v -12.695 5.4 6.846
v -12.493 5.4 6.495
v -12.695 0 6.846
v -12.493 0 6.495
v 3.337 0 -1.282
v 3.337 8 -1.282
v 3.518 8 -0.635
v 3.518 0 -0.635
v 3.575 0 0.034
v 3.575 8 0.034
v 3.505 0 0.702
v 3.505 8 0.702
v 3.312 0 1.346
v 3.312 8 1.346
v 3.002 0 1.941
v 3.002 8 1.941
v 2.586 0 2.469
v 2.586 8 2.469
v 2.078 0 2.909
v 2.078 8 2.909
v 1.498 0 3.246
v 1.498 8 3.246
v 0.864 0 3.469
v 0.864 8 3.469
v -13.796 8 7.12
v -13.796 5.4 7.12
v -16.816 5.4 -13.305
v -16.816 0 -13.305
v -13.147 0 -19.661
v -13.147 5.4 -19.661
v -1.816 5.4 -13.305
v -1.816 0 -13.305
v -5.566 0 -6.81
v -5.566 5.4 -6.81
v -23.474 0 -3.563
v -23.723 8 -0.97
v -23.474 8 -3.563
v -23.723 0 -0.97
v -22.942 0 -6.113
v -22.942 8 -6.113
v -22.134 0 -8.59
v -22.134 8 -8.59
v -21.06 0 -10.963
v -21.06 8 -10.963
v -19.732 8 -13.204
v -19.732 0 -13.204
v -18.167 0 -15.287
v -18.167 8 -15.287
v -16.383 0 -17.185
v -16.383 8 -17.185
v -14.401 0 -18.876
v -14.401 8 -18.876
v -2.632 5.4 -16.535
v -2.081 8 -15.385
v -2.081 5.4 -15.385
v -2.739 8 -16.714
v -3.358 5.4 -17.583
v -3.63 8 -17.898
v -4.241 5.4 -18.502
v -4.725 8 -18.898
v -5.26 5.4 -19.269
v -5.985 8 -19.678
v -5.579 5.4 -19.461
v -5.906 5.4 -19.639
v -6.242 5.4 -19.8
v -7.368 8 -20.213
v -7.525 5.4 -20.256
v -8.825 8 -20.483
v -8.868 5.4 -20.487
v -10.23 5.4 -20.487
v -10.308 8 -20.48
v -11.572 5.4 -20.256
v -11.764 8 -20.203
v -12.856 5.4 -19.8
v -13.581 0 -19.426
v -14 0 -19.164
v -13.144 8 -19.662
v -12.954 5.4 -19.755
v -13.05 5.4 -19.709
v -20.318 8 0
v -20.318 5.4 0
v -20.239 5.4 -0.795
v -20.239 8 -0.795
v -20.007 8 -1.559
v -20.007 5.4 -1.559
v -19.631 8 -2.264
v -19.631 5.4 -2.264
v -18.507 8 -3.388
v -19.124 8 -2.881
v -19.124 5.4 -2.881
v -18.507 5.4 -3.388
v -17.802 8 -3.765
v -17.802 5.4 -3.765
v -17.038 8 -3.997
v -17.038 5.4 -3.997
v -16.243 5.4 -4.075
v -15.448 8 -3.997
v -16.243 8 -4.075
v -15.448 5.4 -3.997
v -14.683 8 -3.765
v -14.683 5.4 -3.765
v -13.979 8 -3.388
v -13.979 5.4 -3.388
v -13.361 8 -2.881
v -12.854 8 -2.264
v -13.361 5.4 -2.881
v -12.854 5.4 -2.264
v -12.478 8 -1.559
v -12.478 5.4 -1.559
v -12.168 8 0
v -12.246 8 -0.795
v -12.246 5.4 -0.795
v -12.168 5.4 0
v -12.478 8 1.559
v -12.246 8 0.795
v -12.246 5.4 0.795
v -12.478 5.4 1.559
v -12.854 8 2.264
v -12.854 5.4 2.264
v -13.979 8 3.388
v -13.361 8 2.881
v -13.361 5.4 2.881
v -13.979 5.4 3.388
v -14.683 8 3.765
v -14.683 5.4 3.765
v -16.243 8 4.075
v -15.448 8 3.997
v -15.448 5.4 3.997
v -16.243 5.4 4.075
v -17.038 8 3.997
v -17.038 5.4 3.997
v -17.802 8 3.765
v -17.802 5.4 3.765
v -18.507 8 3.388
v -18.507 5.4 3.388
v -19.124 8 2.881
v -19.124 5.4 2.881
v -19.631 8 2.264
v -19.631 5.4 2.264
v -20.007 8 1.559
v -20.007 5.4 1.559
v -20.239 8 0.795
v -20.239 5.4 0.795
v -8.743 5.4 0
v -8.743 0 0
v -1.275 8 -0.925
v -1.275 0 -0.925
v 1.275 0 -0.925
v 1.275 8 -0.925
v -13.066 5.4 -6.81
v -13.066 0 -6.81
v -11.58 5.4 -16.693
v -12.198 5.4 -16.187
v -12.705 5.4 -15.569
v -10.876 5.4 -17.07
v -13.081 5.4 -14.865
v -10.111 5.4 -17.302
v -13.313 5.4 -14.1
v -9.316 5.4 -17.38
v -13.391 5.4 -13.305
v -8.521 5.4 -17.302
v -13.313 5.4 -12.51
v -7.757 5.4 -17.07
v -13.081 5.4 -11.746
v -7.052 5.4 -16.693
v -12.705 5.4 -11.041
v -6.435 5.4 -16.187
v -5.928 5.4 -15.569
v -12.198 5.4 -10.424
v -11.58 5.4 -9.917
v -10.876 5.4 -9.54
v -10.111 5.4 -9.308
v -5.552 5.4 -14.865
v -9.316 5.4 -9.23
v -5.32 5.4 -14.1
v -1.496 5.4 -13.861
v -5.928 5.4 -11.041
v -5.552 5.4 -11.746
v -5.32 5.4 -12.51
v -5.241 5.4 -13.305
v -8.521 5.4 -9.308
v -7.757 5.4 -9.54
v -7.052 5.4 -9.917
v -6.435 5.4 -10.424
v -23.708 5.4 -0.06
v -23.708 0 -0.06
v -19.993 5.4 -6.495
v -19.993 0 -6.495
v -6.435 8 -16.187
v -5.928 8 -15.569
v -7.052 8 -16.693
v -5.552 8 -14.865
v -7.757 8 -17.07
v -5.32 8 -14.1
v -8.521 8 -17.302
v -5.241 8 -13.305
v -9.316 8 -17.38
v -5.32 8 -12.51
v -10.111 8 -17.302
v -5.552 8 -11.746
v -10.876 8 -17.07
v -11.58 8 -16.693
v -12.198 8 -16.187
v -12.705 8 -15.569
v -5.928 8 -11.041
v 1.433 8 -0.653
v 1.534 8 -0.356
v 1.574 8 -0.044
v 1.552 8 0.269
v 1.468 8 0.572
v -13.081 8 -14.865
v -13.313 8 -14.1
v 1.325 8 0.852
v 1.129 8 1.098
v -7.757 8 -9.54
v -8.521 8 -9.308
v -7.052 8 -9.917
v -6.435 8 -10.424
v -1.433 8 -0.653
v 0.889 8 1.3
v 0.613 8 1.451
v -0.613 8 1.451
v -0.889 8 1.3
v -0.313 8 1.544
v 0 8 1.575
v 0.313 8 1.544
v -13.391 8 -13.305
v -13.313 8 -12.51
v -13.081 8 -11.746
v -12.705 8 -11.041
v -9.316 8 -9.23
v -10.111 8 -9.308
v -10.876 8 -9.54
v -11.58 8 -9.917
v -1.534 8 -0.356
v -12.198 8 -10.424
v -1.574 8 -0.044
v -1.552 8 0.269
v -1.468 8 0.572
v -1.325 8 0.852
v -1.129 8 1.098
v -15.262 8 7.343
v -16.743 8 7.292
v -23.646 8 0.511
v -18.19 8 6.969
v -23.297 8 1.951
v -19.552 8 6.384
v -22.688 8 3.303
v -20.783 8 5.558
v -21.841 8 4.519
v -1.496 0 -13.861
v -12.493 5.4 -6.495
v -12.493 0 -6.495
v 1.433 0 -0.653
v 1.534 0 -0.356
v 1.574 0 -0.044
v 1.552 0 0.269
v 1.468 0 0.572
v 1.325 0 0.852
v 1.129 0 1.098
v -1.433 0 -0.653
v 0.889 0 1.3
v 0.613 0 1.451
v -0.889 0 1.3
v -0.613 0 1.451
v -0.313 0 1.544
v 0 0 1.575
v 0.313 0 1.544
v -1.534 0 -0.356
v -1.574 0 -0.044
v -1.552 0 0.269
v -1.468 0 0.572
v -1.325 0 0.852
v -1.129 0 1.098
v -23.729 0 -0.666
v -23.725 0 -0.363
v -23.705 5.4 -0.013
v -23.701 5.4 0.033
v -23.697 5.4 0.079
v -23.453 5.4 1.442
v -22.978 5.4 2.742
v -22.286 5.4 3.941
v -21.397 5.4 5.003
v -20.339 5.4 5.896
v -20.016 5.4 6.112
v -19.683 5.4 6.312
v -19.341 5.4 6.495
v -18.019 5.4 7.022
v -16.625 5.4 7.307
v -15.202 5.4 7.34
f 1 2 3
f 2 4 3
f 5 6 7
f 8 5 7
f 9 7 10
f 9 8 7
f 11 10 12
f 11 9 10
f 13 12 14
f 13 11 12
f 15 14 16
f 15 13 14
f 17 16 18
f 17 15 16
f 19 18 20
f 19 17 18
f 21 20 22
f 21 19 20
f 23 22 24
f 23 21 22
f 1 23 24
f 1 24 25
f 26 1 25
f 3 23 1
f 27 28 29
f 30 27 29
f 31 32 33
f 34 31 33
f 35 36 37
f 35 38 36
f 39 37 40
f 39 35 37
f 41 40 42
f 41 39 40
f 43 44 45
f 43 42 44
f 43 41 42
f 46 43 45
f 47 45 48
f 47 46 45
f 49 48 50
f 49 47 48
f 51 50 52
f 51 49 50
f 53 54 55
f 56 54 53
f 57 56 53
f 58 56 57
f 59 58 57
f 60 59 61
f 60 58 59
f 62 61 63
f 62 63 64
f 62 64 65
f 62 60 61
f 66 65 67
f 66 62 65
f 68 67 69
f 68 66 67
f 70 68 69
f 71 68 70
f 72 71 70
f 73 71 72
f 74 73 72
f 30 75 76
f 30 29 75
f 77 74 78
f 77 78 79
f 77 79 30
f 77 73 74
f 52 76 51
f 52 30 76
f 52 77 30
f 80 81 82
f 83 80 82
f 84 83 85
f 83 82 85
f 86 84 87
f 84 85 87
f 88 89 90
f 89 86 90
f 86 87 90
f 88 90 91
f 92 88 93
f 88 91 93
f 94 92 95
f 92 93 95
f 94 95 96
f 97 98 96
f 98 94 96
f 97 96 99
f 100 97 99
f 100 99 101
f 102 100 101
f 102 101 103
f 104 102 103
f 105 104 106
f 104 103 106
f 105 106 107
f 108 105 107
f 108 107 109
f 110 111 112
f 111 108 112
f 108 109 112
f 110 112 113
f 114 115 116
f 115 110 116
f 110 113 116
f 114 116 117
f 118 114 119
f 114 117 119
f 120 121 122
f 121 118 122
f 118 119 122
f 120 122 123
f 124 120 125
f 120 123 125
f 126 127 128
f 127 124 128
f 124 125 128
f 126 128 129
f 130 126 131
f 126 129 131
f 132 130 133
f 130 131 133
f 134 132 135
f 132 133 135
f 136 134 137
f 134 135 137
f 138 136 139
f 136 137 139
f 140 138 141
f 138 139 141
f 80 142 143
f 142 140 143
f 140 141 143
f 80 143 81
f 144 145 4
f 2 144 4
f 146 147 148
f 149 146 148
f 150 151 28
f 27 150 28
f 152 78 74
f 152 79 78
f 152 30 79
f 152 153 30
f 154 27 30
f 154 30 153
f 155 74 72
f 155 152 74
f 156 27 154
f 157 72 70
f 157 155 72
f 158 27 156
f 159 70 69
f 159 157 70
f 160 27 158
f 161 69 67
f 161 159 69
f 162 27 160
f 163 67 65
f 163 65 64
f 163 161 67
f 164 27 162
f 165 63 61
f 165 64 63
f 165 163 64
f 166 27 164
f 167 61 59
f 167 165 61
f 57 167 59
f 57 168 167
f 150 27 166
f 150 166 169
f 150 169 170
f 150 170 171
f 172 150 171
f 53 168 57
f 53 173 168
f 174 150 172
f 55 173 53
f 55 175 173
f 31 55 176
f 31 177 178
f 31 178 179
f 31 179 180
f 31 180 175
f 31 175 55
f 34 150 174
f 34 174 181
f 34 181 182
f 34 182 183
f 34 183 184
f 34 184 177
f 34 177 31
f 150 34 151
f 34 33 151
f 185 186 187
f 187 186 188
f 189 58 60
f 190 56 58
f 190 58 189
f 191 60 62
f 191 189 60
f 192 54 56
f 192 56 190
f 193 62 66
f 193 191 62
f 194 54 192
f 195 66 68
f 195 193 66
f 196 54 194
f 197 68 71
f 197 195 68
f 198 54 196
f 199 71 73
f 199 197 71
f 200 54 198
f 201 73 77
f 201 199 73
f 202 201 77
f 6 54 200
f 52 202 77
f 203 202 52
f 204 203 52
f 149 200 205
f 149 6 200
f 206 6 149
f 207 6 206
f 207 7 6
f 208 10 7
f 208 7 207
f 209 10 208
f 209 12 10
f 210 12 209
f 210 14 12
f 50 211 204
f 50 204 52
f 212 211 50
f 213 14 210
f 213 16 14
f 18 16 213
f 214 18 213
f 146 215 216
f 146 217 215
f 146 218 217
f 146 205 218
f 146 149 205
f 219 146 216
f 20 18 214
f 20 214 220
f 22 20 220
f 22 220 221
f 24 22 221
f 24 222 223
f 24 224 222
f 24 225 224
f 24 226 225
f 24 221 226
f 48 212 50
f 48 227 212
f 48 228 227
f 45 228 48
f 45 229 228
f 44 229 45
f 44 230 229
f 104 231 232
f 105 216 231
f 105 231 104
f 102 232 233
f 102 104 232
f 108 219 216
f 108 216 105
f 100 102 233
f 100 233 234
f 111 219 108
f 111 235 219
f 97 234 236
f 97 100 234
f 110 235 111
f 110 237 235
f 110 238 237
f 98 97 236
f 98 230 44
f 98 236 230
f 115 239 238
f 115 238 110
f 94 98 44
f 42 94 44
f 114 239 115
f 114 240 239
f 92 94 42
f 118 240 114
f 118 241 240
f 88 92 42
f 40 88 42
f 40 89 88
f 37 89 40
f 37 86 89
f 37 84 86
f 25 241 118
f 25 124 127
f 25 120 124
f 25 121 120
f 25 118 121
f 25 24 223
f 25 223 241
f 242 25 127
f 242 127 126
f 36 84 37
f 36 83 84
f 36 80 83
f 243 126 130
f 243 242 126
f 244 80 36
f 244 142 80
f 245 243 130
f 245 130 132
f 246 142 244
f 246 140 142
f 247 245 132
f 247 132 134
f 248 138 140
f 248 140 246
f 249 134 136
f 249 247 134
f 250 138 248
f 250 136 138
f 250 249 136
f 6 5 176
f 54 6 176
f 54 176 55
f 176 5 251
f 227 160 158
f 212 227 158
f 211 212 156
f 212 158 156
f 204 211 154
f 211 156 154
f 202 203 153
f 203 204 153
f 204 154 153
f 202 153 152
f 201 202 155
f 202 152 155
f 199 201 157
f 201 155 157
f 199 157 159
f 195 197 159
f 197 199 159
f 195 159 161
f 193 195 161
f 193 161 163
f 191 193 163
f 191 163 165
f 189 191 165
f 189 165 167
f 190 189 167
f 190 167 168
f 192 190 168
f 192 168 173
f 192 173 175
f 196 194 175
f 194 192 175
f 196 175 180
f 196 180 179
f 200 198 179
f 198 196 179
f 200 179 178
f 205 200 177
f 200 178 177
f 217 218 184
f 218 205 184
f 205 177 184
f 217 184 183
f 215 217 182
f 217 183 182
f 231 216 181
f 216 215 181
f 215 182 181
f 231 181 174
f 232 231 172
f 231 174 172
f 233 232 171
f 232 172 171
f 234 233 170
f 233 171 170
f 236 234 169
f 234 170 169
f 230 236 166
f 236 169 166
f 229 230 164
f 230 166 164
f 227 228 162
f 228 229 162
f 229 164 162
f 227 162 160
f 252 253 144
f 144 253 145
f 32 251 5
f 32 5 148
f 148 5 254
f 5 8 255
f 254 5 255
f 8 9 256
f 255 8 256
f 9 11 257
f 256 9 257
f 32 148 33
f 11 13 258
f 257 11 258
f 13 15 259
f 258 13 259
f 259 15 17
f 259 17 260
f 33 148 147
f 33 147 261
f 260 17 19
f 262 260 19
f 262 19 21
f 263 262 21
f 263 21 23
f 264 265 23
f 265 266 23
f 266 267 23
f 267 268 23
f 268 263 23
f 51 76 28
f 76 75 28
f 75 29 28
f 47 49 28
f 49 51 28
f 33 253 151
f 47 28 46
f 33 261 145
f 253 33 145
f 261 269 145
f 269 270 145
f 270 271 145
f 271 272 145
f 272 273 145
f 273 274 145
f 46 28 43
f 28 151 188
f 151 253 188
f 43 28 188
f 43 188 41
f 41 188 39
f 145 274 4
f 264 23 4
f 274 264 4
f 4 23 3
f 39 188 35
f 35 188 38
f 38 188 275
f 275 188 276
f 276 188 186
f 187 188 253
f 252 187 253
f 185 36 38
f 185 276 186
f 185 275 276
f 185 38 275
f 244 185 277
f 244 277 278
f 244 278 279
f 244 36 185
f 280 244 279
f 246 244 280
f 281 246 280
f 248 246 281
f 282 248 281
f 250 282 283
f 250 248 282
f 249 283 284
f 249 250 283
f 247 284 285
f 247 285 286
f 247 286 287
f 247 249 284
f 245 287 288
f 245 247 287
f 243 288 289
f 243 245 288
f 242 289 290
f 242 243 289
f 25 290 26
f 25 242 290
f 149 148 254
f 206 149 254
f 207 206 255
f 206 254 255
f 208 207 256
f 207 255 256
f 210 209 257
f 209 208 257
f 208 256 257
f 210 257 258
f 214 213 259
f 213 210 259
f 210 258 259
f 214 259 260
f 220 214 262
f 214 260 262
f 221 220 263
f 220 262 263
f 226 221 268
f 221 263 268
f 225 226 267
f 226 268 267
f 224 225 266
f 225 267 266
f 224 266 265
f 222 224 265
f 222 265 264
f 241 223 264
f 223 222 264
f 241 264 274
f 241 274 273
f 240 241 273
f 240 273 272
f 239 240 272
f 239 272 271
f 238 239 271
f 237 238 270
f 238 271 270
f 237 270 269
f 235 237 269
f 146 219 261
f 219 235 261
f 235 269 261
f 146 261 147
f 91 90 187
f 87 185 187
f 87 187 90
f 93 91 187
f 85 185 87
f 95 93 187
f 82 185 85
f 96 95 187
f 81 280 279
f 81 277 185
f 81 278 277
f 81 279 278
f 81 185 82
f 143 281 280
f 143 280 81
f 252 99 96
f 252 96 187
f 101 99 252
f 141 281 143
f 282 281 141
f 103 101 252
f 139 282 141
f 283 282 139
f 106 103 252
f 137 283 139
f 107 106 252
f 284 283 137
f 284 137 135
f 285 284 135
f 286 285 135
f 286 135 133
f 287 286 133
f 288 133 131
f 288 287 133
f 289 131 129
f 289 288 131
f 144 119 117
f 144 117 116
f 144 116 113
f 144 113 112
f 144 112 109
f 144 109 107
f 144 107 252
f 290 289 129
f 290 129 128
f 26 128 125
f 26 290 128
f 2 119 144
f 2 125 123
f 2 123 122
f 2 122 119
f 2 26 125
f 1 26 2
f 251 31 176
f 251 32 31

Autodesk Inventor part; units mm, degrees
ref_plane "YZ Plane" through (0, 0, 0) normal (1, 0, 0) x (0, 1, 0)
ref_plane "XZ Plane" through (0, 0, 0) normal (0, 1, 0) x (-1, 0, 0)
ref_plane "XY Plane" through (0, 0, 0) normal (0, 0, 1) x (1, 0, 0)
sketch "Sketch1" plane through (0, 0, 0) normal (0, 1, 0) x (-1, 0, 0)
  arc A0 (1.2748, -0.925) -> (-1.2748, -0.925) centre (0, 0) ccw
  line L0 (1.2748, -0.925) -> (-1.2748, -0.925)
  arc A1 (-0.8639, 3.4691) -> (-3.3372, -1.2821) centre (0, 0) ccw
  line L1 (-0.8639, 3.4691) -> (21.9124, 9.141)
  line L2 (-3.3372, -1.2821) -> (5.0806, -23.1927)
  arc A2 (5.0806, -23.1927) -> (21.9124, 9.141) centre (0, 0) ccw
  circle A3 centre (16.2426, 0) radius 4.075
  circle A4 centre (9.3164, -13.3052) radius 4.075
  circle A5 centre (16.2426, 0) radius 7.5 construction
  circle A6 centre (9.3164, -13.3052) radius 7.5 construction
  line L3 (0, 0) -> (16.2426, 0) construction
  line L4 (0, 0) -> (9.3164, -13.3052) construction
  line L5 (12.4926, -6.4952) -> (8.7426, 0)
  line L6 (8.7426, 0) -> (12.4926, 6.4952)
  line L7 (12.4926, 6.4952) -> (19.9926, 6.4952)
  line L8 (19.9926, 6.4952) -> (23.7426, 0)
  line L9 (23.7426, 0) -> (19.9926, -6.4952)
  line L10 (19.9926, -6.4952) -> (12.4926, -6.4952)
  line L11 (16.8164, -13.3052) -> (13.0664, -19.8004)
  line L12 (13.0664, -19.8004) -> (5.5664, -19.8004)
  line L13 (5.5664, -19.8004) -> (1.8164, -13.3052)
  line L14 (1.8164, -13.3052) -> (5.5664, -6.81)
  line L15 (5.5664, -6.81) -> (13.0664, -6.81)
  line L16 (13.0664, -6.81) -> (16.8164, -13.3052)
  dimension "d5" = 15
  dimension "d6" = 15
  dimension "d0" = 3.15
  dimension "d1" = 2.5
  dimension "d2" = 2
  dimension "d3" = 8.15
  dimension "d4" = 8.15
  dimension "d7" = 55
extrude "Extrusion1" add sketch "Sketch1" along normal blind 8 contours L9 L10 L5 L6 L7 L8 | L1 A2 L2 A1 | L11 L12 L13 L14 L15 L16
fillet "Fillet1" radius 8 2 edges at (-21.9124, 4, 9.141) (-5.0806, 4, -23.1927)
extrude "Extrusion2" cut sketch "Sketch1" along normal blind 5.4 contours L9 L10 L5 L6 L7 L8 | L11 L12 L13 L14 L15 L16
sketch "Sketch2" plane through (0, 0, 0) normal (0, -1, 0) x (1, 0, 0)
  arc A0 (-12.8561, -19.8004) -> (-6.2416, -19.8004) centre (-9.5488, -12.516) ccw projected
  line L0 (-6.2416, -19.8004) -> (-12.8561, -19.8004) projected
  arc A1 (-12.8561, -19.8004) -> (-6.2416, -19.8004) centre (-9.5488, -12.516) ccw projected
  line L1 (-23.6968, 0.0794) -> (-20.3388, 5.8956) projected
  arc A2 (-20.3388, 5.8956) -> (-23.6968, 0.0794) centre (-15.7295, -0.6431) ccw projected
  line L2 (-12.4926, 6.4952) -> (-8.7426, 0) projected
  line L3 (-12.4926, 6.4952) -> (-12.6949, 6.8456)
  line L4 (-13.7963, 7.1199) -> (0.8639, 3.4691) projected
  line L5 (-5.5664, -6.81) -> (-1.8164, -13.3052) projected
  line L6 (-1.8164, -13.3052) -> (-1.4955, -13.861)
  line L7 (3.3372, -1.2821) -> (-2.081, -15.385) projected
  line L8 (-1.2748, -0.925) -> (1.2748, -0.925) projected
  arc A3 (1.2748, -0.925) -> (-1.2748, -0.925) centre (0, 0) ccw projected
  line L9 (-13.1467, -19.6613) -> (-16.8164, -13.3052) projected
  line L10 (-16.8164, -13.3052) -> (-13.0664, -6.81) projected
  line L11 (-13.0664, -6.81) -> (-5.5664, -6.81) projected
  line L12 (-5.5664, -6.81) -> (-1.8164, -13.3052) projected
  line L13 (-1.8164, -13.3052) -> (-5.2596, -19.2689) projected
  arc A4 (-5.2596, -19.2689) -> (-2.081, -15.385) centre (-9.5488, -12.516) ccw projected
  line L14 (3.3372, -1.2821) -> (-2.081, -15.385) projected
  arc A5 (3.3372, -1.2821) -> (0.8639, 3.4691) centre (0, 0) ccw projected
  line L15 (-13.7963, 7.1199) -> (0.8639, 3.4691) projected
  arc A6 (-13.7963, 7.1199) -> (-19.3413, 6.4952) centre (-15.7295, -0.6431) ccw projected
  line L16 (-19.3413, 6.4952) -> (-12.4926, 6.4952) projected
  line L17 (-12.4926, 6.4952) -> (-8.7426, 0) projected
  line L18 (-8.7426, 0) -> (-12.4926, -6.4952) projected
  line L19 (-12.4926, -6.4952) -> (-19.9926, -6.4952) projected
  line L20 (-19.9926, -6.4952) -> (-23.7082, -0.0597) projected
  arc A7 (-23.7082, -0.0597) -> (-23.7228, -0.9698) centre (-15.7295, -0.6431) ccw projected
  arc A8 (-23.7228, -0.9698) -> (-14.4013, -18.8763) centre (0, 0) ccw projected
  arc A9 (-14.4013, -18.8763) -> (-13.1467, -19.6613) centre (-9.5488, -12.516) ccw projected
  point P0 (-2.081, -15.385)
  point P1 (-13.7963, 7.1199)
extrude "Extrusion3" cut sketch "Sketch2" against normal up to surface (5.4 mm away) contours L0 A0 | A2 L1 | L16 A6 L4 L3 | L7 A4 L13 L6 | A3 L8
properties part number "Desbalanceo"
